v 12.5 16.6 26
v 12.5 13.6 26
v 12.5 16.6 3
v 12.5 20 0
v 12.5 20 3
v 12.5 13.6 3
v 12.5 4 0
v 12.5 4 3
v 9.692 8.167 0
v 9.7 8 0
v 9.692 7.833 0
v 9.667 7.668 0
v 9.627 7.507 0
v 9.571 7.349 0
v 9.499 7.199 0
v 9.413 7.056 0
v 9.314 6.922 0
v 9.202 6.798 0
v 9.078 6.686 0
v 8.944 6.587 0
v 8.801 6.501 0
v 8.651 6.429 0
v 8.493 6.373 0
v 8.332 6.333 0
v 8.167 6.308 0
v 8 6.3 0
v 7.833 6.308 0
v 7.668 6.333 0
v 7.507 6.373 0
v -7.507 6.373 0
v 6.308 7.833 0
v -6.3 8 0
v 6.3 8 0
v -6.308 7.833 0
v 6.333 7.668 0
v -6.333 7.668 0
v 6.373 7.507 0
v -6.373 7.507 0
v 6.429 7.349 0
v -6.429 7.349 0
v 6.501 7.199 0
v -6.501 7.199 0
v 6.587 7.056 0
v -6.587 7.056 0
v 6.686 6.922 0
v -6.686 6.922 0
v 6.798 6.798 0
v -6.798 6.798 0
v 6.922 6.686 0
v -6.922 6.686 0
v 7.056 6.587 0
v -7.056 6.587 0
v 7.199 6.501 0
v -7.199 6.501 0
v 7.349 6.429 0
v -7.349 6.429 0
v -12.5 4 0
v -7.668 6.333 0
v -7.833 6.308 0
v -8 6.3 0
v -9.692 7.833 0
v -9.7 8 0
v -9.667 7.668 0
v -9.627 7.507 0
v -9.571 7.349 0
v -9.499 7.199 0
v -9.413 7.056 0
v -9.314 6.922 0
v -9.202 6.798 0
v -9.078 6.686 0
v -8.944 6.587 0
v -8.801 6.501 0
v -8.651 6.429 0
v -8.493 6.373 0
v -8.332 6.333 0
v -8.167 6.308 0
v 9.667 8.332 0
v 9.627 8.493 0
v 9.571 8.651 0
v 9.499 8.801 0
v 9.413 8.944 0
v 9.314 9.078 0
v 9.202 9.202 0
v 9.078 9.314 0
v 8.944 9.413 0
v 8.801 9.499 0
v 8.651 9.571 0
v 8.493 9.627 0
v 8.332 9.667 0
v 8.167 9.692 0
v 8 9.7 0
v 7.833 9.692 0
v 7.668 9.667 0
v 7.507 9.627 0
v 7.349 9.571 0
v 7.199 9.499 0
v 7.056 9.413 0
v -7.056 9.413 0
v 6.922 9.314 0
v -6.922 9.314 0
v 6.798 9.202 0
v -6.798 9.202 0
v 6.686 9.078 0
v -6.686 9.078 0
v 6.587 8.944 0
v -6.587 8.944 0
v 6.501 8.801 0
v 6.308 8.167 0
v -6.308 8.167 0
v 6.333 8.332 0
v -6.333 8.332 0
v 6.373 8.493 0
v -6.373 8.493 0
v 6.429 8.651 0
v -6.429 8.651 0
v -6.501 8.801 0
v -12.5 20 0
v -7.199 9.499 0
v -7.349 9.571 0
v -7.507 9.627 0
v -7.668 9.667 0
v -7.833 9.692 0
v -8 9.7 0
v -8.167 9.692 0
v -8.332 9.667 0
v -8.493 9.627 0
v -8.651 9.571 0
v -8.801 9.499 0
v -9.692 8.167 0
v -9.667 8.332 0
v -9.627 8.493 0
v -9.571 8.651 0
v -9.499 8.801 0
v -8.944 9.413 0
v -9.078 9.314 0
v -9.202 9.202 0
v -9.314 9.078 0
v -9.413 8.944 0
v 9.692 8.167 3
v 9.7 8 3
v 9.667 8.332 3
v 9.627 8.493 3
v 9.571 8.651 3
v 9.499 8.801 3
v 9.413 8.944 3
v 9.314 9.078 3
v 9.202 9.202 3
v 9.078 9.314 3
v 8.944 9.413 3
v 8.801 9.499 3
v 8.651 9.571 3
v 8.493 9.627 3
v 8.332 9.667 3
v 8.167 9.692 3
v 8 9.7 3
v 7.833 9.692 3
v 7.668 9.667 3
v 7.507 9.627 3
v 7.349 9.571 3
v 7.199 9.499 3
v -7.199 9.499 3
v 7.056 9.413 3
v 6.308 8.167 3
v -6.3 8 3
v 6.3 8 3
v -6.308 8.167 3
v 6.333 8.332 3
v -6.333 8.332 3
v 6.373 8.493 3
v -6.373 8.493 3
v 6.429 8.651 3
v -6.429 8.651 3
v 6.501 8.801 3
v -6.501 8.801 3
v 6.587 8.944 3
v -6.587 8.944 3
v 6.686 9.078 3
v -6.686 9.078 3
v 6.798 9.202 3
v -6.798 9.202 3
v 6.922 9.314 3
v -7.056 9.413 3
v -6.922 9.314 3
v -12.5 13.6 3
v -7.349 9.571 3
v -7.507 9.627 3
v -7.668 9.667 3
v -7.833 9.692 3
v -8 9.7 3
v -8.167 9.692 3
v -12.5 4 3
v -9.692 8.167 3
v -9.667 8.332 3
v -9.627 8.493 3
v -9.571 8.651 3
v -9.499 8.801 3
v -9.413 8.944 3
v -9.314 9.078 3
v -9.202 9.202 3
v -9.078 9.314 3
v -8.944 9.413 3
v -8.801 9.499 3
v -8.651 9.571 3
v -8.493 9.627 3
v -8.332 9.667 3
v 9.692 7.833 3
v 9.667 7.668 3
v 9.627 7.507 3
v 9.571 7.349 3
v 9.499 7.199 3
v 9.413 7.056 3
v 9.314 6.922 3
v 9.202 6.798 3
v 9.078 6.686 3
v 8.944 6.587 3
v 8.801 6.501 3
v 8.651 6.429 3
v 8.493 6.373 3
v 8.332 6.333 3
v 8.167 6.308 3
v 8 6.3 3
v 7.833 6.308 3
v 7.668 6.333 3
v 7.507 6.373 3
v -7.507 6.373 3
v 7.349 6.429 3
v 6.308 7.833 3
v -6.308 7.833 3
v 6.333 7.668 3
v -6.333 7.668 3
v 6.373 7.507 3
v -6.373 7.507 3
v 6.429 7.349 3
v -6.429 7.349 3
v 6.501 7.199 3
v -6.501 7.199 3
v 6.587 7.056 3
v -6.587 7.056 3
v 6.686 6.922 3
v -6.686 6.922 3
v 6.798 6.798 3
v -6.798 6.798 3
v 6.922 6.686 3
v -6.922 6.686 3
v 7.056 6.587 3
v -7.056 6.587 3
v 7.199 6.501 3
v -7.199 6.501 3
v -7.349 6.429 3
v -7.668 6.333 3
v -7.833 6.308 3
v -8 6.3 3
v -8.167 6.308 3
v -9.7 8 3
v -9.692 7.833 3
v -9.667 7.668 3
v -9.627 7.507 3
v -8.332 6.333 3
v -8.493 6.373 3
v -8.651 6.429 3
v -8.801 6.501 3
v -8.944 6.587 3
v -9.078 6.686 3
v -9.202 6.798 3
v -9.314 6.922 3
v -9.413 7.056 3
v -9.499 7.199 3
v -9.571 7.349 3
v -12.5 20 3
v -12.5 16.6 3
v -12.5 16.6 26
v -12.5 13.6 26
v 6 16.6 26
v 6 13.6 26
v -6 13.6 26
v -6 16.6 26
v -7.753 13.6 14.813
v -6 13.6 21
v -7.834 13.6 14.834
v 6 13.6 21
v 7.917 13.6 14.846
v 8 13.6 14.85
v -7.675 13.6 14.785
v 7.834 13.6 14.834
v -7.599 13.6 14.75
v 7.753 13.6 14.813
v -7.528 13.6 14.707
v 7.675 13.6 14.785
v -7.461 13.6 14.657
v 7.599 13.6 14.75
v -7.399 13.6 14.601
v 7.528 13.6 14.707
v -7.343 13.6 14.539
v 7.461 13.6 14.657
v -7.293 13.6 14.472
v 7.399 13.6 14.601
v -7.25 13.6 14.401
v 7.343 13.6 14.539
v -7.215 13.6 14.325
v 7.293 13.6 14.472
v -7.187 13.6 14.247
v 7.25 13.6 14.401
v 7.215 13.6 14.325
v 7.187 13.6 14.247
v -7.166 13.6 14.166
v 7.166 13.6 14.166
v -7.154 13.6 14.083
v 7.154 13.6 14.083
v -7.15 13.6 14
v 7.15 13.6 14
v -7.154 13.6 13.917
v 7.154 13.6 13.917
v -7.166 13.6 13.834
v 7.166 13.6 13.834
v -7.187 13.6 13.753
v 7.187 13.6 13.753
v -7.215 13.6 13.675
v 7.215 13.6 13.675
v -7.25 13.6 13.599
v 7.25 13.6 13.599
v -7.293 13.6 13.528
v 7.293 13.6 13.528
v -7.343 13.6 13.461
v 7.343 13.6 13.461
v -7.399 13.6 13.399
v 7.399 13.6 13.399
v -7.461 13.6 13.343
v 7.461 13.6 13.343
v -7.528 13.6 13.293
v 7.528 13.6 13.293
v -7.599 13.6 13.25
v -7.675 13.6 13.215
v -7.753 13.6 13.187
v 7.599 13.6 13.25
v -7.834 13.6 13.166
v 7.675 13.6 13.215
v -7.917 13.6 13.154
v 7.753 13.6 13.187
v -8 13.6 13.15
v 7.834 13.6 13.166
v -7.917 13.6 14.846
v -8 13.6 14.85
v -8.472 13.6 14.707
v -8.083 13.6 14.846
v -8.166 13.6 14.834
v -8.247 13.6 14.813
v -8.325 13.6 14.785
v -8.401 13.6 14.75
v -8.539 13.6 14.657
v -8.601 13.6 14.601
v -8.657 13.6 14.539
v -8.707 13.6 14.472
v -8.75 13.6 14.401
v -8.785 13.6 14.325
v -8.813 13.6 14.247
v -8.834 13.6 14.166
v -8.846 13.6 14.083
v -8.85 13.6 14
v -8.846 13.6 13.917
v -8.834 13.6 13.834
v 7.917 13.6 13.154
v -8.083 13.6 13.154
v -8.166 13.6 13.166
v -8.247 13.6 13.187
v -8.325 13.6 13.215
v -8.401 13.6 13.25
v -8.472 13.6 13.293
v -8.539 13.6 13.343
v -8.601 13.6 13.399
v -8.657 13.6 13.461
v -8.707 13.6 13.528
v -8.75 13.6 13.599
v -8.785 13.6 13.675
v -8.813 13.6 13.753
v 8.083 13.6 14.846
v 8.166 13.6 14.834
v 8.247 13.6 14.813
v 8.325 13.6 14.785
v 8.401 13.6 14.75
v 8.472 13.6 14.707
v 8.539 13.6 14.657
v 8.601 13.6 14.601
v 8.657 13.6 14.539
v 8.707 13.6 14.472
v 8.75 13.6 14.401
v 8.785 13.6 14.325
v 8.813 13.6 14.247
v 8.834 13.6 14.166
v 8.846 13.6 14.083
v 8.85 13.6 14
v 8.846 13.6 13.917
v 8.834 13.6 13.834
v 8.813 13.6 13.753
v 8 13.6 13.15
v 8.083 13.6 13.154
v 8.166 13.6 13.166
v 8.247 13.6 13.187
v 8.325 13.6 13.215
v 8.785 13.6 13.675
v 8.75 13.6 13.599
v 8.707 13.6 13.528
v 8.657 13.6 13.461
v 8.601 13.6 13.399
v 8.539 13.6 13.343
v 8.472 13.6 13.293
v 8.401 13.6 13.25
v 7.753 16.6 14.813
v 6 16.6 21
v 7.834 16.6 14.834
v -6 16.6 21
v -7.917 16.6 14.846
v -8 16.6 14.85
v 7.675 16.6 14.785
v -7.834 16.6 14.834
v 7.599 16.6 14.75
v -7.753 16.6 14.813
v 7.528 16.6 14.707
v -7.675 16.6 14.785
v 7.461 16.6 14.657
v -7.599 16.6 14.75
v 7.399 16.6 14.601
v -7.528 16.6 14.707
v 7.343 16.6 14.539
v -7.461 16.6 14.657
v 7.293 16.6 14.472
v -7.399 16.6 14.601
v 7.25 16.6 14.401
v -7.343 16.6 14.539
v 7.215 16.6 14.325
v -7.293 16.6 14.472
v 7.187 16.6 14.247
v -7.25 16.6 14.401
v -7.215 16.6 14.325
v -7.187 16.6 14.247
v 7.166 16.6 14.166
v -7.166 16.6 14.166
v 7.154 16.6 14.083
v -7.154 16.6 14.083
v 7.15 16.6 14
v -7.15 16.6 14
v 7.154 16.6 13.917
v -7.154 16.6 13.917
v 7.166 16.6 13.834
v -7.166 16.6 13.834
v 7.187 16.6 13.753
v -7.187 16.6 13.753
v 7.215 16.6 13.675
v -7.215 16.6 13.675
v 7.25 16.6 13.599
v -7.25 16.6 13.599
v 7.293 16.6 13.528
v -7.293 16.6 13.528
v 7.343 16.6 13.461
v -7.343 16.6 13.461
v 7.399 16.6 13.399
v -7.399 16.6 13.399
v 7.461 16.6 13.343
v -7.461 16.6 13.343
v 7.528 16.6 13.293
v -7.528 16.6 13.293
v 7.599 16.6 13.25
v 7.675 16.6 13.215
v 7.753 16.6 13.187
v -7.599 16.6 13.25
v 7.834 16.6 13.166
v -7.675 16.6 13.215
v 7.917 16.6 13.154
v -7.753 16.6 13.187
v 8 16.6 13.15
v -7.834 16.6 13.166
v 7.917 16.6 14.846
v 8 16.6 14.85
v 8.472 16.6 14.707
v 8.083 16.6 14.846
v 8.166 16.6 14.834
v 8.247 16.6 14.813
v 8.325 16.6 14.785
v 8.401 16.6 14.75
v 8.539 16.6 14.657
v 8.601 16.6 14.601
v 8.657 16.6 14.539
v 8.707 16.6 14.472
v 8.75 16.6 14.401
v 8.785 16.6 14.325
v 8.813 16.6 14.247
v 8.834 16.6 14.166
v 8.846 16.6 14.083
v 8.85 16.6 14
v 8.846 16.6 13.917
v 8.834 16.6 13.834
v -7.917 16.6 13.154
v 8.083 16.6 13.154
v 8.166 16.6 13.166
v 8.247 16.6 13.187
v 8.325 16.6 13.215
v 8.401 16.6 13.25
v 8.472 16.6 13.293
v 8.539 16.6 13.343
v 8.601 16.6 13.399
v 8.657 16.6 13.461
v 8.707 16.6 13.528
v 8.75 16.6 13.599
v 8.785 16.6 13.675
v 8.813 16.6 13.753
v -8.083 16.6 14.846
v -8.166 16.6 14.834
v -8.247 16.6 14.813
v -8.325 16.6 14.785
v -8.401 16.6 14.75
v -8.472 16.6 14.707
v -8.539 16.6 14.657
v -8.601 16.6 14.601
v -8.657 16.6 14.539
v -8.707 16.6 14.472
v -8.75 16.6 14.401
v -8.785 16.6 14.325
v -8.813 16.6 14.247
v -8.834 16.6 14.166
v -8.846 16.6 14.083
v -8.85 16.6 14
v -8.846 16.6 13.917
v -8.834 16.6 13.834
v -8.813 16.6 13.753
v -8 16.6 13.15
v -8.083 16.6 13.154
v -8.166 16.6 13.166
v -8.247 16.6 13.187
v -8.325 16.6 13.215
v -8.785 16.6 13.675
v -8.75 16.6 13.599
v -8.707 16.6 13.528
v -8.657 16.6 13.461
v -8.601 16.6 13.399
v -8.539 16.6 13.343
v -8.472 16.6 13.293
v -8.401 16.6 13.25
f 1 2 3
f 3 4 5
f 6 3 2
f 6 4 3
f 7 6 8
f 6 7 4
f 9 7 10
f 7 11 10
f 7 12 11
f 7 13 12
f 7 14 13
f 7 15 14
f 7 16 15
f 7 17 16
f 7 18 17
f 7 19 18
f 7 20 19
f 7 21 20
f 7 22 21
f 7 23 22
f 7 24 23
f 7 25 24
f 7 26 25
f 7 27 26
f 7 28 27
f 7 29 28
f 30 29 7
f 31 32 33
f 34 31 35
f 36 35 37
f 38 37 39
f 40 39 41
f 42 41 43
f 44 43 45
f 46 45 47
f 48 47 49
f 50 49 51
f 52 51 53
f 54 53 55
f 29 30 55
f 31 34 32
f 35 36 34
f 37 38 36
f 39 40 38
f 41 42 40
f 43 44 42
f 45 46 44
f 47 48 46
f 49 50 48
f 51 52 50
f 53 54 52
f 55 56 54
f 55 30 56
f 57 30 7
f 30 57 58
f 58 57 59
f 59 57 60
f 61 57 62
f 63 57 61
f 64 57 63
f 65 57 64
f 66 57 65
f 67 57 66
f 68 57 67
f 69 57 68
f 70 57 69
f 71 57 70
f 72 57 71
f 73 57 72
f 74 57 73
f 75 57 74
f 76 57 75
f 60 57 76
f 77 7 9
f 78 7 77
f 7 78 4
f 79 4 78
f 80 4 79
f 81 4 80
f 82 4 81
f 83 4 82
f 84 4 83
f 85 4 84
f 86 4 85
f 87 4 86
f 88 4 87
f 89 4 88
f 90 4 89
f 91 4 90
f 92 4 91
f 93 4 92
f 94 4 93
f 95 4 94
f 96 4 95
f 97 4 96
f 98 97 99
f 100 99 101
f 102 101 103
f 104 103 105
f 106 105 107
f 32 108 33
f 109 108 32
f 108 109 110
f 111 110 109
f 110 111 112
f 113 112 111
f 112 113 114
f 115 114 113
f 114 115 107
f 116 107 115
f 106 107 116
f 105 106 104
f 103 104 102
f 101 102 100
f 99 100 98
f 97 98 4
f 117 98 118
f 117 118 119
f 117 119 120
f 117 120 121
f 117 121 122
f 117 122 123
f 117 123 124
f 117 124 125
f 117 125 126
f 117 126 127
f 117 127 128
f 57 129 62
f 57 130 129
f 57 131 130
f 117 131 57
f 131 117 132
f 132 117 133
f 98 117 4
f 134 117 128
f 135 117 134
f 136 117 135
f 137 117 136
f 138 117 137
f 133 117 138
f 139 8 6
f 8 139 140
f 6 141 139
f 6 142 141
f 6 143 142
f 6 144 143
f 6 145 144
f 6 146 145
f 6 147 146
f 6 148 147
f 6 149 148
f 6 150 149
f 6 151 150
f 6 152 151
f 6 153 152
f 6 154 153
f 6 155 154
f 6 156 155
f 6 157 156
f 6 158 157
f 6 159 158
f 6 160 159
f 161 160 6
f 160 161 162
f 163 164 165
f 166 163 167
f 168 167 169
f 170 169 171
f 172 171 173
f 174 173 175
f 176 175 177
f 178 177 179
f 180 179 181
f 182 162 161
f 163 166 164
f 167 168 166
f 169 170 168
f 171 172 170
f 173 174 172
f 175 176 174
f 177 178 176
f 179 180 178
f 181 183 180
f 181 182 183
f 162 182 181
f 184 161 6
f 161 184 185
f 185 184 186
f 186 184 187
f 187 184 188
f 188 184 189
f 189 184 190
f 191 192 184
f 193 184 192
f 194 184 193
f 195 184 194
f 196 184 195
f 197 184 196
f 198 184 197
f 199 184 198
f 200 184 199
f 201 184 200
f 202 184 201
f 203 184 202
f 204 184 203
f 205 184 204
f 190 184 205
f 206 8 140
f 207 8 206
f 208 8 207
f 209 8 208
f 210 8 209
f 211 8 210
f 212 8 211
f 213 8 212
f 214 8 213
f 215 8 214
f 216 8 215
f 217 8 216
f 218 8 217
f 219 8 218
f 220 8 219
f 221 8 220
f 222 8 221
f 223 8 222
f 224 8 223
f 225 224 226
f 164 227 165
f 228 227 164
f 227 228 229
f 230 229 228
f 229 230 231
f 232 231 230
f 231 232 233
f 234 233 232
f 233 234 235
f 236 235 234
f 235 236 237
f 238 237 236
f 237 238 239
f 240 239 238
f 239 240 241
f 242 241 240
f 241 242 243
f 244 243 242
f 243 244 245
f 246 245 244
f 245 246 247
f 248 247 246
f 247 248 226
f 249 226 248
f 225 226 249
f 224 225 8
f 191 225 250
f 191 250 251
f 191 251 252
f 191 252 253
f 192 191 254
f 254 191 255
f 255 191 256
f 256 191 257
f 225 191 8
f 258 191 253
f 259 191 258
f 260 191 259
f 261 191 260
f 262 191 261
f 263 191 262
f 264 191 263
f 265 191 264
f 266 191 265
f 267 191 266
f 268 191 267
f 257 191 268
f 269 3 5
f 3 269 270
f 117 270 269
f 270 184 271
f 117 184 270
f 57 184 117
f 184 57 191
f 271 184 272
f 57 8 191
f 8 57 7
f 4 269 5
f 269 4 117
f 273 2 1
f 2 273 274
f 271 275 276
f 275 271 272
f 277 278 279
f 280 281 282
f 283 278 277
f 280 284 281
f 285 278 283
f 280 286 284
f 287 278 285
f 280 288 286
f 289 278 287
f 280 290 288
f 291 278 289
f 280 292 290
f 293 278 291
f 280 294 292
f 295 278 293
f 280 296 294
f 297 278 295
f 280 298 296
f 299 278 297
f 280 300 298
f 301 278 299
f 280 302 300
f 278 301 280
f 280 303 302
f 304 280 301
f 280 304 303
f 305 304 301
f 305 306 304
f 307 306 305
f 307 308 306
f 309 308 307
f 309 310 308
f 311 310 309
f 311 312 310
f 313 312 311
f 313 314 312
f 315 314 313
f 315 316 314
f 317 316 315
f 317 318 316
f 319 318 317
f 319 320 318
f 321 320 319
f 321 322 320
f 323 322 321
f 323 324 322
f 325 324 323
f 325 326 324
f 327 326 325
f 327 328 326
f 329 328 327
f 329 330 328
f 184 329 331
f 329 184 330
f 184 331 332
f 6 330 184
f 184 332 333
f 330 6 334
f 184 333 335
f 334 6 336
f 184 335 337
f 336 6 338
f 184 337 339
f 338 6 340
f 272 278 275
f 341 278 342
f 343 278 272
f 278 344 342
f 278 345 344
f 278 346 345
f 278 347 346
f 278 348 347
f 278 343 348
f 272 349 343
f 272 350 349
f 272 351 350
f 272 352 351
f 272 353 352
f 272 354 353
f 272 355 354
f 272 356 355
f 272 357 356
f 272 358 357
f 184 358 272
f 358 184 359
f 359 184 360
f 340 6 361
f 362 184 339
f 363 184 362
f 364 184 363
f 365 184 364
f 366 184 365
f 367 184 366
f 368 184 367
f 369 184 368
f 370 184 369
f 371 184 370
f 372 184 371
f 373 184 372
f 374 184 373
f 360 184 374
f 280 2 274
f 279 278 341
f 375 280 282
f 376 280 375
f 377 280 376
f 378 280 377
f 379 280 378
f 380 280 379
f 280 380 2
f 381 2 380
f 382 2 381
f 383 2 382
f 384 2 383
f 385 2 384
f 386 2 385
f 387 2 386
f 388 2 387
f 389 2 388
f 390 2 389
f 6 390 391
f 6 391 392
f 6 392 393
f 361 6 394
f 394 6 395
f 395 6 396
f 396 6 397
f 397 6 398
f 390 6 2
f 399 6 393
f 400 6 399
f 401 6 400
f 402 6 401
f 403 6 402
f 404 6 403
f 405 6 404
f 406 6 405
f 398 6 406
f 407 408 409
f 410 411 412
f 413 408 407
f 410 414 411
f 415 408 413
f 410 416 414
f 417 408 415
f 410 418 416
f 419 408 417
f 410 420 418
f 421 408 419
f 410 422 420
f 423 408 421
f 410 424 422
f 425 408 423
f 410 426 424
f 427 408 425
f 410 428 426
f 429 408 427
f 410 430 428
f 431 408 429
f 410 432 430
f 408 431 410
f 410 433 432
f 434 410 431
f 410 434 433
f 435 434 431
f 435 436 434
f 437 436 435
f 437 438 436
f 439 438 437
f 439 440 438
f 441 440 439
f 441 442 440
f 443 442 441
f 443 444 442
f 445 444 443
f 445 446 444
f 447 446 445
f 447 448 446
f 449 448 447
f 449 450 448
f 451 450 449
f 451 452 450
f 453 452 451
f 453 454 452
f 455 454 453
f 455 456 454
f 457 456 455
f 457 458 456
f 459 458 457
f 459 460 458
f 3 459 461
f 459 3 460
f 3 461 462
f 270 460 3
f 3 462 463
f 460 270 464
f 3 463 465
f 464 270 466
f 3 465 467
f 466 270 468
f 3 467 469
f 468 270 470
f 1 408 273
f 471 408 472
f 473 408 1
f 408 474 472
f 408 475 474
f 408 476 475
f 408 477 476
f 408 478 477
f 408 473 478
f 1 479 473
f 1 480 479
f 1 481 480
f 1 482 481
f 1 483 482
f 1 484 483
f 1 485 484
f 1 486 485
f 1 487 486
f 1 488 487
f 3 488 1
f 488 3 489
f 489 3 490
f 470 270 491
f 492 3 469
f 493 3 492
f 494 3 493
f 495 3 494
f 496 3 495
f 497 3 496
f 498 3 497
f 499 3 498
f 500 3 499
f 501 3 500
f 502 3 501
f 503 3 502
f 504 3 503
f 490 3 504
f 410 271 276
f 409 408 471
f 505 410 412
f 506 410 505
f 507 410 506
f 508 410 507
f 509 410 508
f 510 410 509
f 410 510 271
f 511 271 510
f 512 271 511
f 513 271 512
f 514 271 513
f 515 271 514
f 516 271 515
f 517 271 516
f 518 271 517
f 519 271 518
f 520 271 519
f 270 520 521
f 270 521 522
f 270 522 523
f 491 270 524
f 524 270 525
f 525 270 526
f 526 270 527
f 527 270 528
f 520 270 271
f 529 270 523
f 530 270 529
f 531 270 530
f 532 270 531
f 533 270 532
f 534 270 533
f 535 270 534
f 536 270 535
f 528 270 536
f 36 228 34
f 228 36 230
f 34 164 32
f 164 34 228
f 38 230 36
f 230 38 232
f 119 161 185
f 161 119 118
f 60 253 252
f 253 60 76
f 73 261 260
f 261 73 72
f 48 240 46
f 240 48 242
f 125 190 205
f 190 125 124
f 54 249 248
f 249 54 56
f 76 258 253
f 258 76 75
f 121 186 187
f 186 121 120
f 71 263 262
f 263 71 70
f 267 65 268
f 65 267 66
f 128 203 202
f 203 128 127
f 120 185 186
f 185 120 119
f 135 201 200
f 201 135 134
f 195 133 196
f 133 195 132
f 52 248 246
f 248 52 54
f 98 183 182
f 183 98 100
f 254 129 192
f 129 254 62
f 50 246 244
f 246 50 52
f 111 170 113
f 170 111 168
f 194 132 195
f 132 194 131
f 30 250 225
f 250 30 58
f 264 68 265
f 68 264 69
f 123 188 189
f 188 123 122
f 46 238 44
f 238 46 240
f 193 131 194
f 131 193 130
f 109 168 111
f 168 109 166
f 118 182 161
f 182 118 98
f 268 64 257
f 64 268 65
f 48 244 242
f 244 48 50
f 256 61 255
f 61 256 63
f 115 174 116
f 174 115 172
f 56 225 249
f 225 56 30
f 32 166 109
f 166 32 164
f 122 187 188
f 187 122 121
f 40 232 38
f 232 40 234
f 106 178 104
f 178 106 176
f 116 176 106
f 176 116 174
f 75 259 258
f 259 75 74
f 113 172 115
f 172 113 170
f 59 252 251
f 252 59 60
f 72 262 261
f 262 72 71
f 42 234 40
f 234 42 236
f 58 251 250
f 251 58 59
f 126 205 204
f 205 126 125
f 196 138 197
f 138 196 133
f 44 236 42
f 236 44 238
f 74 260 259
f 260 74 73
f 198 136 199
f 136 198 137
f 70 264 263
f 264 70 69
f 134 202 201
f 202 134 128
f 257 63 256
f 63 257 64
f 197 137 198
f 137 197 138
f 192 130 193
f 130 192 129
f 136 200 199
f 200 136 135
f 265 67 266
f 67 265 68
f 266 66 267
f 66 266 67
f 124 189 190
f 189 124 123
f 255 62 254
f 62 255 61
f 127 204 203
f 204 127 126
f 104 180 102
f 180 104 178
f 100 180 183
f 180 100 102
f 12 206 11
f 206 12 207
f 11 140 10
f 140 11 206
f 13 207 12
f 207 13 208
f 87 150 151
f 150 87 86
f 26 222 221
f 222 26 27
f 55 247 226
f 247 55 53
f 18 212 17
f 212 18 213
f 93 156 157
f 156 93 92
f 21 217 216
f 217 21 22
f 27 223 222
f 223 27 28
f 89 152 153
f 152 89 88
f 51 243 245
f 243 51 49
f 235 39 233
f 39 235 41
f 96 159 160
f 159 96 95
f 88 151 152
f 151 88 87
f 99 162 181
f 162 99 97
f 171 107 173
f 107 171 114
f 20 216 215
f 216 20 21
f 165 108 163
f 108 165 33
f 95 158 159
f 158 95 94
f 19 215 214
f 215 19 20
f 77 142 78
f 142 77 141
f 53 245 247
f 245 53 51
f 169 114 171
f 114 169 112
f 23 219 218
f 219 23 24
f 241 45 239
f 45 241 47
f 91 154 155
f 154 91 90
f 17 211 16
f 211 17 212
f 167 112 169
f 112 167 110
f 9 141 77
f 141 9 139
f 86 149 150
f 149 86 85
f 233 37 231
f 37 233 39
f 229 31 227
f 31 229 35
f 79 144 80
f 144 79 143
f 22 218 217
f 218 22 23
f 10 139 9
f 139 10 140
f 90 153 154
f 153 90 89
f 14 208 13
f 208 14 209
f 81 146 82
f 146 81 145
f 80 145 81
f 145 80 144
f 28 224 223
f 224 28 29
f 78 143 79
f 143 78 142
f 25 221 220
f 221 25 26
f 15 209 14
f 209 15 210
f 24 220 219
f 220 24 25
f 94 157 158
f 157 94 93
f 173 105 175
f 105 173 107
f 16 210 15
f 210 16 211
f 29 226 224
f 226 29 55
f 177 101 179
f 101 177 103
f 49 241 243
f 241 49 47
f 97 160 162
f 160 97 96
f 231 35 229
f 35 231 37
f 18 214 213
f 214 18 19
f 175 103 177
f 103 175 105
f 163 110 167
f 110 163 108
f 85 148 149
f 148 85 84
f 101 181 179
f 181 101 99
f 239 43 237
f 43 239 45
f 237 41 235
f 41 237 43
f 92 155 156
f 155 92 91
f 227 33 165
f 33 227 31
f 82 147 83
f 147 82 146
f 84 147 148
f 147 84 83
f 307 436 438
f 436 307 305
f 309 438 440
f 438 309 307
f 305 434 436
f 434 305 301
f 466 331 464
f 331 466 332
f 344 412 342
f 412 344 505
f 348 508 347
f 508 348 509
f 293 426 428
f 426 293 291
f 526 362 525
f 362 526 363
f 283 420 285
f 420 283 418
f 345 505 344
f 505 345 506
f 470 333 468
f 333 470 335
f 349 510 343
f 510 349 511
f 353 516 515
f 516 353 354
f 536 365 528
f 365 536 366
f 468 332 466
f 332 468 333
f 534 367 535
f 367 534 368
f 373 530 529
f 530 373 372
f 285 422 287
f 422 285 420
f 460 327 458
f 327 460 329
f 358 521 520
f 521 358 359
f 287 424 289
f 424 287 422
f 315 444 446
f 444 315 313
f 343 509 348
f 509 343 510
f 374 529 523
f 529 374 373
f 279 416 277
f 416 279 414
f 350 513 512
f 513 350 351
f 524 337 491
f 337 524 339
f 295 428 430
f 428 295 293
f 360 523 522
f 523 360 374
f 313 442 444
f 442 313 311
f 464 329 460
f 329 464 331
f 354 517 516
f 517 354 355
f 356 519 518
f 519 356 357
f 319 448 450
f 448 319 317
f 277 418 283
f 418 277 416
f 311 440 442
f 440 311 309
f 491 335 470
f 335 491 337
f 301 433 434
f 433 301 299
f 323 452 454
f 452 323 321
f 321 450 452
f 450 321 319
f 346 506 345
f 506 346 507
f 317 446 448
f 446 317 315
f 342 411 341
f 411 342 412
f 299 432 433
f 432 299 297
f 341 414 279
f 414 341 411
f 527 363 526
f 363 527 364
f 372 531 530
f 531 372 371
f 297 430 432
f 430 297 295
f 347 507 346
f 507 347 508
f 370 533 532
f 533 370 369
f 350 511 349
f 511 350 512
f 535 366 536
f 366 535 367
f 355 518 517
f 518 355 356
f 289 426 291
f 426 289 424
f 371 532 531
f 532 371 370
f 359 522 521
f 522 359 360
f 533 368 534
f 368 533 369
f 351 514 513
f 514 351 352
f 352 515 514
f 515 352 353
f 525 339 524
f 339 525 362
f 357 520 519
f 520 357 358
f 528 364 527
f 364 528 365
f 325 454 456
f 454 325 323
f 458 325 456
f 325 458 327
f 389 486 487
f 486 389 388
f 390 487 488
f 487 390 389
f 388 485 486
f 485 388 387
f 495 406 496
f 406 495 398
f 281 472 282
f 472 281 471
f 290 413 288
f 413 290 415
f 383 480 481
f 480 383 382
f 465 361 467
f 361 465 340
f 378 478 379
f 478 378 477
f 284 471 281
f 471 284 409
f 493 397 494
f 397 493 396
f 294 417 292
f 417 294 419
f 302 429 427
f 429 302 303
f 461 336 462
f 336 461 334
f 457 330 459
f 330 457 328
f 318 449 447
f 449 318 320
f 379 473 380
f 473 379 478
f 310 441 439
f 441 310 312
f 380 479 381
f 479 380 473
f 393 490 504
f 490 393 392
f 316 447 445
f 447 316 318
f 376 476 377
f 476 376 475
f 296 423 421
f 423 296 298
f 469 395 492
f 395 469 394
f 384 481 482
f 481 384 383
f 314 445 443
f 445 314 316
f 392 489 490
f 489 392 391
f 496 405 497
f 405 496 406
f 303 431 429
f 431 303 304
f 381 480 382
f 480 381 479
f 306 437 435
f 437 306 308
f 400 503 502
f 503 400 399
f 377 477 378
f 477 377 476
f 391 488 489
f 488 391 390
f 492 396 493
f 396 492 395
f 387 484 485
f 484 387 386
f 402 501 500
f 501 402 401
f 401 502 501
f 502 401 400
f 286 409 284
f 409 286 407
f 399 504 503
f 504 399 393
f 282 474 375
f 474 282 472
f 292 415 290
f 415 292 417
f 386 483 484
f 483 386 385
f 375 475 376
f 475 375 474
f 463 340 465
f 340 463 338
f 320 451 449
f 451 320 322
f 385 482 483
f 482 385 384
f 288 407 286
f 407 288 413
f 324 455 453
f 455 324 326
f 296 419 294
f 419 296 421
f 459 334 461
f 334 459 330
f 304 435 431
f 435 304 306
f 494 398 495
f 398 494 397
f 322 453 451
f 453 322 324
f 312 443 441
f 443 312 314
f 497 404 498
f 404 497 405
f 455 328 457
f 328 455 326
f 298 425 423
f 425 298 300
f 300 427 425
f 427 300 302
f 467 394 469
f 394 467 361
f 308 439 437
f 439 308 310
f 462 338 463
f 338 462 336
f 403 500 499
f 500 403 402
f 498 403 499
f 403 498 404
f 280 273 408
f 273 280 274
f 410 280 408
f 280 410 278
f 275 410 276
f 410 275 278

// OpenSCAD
// Standalone v5.2 ankle PCB T-bracket (print orientation: flipped so the
// bridge-contact face of the bar is on the build plate).
// T shape: horizontal bar screws up into the carrier top-bridge underside
// - M3 CLEARANCE (3.4) through-holes in this bar, self-tap PILOTS (2.7)
// are in the bridge; the screw row sits BEHIND the vertical plate so the
// driver has a straight shot from below. The vertical plate carries the
// AS5047P module facing the front-axle magnet (2 x M2 self-tap, pilot 1.7)
// with a ribbon slot for the 6-wire SPI cable.
// Assembly: screw the PCB to the plate FIRST, then bolt the bar to the
// bridge from the open center of the carrier.
// Edit shared dimensions in frame_v5.scad so everything stays linked.

part_mode = "ankle_pcb_bracket";
print_export = true;

include <frame_v5.scad>
